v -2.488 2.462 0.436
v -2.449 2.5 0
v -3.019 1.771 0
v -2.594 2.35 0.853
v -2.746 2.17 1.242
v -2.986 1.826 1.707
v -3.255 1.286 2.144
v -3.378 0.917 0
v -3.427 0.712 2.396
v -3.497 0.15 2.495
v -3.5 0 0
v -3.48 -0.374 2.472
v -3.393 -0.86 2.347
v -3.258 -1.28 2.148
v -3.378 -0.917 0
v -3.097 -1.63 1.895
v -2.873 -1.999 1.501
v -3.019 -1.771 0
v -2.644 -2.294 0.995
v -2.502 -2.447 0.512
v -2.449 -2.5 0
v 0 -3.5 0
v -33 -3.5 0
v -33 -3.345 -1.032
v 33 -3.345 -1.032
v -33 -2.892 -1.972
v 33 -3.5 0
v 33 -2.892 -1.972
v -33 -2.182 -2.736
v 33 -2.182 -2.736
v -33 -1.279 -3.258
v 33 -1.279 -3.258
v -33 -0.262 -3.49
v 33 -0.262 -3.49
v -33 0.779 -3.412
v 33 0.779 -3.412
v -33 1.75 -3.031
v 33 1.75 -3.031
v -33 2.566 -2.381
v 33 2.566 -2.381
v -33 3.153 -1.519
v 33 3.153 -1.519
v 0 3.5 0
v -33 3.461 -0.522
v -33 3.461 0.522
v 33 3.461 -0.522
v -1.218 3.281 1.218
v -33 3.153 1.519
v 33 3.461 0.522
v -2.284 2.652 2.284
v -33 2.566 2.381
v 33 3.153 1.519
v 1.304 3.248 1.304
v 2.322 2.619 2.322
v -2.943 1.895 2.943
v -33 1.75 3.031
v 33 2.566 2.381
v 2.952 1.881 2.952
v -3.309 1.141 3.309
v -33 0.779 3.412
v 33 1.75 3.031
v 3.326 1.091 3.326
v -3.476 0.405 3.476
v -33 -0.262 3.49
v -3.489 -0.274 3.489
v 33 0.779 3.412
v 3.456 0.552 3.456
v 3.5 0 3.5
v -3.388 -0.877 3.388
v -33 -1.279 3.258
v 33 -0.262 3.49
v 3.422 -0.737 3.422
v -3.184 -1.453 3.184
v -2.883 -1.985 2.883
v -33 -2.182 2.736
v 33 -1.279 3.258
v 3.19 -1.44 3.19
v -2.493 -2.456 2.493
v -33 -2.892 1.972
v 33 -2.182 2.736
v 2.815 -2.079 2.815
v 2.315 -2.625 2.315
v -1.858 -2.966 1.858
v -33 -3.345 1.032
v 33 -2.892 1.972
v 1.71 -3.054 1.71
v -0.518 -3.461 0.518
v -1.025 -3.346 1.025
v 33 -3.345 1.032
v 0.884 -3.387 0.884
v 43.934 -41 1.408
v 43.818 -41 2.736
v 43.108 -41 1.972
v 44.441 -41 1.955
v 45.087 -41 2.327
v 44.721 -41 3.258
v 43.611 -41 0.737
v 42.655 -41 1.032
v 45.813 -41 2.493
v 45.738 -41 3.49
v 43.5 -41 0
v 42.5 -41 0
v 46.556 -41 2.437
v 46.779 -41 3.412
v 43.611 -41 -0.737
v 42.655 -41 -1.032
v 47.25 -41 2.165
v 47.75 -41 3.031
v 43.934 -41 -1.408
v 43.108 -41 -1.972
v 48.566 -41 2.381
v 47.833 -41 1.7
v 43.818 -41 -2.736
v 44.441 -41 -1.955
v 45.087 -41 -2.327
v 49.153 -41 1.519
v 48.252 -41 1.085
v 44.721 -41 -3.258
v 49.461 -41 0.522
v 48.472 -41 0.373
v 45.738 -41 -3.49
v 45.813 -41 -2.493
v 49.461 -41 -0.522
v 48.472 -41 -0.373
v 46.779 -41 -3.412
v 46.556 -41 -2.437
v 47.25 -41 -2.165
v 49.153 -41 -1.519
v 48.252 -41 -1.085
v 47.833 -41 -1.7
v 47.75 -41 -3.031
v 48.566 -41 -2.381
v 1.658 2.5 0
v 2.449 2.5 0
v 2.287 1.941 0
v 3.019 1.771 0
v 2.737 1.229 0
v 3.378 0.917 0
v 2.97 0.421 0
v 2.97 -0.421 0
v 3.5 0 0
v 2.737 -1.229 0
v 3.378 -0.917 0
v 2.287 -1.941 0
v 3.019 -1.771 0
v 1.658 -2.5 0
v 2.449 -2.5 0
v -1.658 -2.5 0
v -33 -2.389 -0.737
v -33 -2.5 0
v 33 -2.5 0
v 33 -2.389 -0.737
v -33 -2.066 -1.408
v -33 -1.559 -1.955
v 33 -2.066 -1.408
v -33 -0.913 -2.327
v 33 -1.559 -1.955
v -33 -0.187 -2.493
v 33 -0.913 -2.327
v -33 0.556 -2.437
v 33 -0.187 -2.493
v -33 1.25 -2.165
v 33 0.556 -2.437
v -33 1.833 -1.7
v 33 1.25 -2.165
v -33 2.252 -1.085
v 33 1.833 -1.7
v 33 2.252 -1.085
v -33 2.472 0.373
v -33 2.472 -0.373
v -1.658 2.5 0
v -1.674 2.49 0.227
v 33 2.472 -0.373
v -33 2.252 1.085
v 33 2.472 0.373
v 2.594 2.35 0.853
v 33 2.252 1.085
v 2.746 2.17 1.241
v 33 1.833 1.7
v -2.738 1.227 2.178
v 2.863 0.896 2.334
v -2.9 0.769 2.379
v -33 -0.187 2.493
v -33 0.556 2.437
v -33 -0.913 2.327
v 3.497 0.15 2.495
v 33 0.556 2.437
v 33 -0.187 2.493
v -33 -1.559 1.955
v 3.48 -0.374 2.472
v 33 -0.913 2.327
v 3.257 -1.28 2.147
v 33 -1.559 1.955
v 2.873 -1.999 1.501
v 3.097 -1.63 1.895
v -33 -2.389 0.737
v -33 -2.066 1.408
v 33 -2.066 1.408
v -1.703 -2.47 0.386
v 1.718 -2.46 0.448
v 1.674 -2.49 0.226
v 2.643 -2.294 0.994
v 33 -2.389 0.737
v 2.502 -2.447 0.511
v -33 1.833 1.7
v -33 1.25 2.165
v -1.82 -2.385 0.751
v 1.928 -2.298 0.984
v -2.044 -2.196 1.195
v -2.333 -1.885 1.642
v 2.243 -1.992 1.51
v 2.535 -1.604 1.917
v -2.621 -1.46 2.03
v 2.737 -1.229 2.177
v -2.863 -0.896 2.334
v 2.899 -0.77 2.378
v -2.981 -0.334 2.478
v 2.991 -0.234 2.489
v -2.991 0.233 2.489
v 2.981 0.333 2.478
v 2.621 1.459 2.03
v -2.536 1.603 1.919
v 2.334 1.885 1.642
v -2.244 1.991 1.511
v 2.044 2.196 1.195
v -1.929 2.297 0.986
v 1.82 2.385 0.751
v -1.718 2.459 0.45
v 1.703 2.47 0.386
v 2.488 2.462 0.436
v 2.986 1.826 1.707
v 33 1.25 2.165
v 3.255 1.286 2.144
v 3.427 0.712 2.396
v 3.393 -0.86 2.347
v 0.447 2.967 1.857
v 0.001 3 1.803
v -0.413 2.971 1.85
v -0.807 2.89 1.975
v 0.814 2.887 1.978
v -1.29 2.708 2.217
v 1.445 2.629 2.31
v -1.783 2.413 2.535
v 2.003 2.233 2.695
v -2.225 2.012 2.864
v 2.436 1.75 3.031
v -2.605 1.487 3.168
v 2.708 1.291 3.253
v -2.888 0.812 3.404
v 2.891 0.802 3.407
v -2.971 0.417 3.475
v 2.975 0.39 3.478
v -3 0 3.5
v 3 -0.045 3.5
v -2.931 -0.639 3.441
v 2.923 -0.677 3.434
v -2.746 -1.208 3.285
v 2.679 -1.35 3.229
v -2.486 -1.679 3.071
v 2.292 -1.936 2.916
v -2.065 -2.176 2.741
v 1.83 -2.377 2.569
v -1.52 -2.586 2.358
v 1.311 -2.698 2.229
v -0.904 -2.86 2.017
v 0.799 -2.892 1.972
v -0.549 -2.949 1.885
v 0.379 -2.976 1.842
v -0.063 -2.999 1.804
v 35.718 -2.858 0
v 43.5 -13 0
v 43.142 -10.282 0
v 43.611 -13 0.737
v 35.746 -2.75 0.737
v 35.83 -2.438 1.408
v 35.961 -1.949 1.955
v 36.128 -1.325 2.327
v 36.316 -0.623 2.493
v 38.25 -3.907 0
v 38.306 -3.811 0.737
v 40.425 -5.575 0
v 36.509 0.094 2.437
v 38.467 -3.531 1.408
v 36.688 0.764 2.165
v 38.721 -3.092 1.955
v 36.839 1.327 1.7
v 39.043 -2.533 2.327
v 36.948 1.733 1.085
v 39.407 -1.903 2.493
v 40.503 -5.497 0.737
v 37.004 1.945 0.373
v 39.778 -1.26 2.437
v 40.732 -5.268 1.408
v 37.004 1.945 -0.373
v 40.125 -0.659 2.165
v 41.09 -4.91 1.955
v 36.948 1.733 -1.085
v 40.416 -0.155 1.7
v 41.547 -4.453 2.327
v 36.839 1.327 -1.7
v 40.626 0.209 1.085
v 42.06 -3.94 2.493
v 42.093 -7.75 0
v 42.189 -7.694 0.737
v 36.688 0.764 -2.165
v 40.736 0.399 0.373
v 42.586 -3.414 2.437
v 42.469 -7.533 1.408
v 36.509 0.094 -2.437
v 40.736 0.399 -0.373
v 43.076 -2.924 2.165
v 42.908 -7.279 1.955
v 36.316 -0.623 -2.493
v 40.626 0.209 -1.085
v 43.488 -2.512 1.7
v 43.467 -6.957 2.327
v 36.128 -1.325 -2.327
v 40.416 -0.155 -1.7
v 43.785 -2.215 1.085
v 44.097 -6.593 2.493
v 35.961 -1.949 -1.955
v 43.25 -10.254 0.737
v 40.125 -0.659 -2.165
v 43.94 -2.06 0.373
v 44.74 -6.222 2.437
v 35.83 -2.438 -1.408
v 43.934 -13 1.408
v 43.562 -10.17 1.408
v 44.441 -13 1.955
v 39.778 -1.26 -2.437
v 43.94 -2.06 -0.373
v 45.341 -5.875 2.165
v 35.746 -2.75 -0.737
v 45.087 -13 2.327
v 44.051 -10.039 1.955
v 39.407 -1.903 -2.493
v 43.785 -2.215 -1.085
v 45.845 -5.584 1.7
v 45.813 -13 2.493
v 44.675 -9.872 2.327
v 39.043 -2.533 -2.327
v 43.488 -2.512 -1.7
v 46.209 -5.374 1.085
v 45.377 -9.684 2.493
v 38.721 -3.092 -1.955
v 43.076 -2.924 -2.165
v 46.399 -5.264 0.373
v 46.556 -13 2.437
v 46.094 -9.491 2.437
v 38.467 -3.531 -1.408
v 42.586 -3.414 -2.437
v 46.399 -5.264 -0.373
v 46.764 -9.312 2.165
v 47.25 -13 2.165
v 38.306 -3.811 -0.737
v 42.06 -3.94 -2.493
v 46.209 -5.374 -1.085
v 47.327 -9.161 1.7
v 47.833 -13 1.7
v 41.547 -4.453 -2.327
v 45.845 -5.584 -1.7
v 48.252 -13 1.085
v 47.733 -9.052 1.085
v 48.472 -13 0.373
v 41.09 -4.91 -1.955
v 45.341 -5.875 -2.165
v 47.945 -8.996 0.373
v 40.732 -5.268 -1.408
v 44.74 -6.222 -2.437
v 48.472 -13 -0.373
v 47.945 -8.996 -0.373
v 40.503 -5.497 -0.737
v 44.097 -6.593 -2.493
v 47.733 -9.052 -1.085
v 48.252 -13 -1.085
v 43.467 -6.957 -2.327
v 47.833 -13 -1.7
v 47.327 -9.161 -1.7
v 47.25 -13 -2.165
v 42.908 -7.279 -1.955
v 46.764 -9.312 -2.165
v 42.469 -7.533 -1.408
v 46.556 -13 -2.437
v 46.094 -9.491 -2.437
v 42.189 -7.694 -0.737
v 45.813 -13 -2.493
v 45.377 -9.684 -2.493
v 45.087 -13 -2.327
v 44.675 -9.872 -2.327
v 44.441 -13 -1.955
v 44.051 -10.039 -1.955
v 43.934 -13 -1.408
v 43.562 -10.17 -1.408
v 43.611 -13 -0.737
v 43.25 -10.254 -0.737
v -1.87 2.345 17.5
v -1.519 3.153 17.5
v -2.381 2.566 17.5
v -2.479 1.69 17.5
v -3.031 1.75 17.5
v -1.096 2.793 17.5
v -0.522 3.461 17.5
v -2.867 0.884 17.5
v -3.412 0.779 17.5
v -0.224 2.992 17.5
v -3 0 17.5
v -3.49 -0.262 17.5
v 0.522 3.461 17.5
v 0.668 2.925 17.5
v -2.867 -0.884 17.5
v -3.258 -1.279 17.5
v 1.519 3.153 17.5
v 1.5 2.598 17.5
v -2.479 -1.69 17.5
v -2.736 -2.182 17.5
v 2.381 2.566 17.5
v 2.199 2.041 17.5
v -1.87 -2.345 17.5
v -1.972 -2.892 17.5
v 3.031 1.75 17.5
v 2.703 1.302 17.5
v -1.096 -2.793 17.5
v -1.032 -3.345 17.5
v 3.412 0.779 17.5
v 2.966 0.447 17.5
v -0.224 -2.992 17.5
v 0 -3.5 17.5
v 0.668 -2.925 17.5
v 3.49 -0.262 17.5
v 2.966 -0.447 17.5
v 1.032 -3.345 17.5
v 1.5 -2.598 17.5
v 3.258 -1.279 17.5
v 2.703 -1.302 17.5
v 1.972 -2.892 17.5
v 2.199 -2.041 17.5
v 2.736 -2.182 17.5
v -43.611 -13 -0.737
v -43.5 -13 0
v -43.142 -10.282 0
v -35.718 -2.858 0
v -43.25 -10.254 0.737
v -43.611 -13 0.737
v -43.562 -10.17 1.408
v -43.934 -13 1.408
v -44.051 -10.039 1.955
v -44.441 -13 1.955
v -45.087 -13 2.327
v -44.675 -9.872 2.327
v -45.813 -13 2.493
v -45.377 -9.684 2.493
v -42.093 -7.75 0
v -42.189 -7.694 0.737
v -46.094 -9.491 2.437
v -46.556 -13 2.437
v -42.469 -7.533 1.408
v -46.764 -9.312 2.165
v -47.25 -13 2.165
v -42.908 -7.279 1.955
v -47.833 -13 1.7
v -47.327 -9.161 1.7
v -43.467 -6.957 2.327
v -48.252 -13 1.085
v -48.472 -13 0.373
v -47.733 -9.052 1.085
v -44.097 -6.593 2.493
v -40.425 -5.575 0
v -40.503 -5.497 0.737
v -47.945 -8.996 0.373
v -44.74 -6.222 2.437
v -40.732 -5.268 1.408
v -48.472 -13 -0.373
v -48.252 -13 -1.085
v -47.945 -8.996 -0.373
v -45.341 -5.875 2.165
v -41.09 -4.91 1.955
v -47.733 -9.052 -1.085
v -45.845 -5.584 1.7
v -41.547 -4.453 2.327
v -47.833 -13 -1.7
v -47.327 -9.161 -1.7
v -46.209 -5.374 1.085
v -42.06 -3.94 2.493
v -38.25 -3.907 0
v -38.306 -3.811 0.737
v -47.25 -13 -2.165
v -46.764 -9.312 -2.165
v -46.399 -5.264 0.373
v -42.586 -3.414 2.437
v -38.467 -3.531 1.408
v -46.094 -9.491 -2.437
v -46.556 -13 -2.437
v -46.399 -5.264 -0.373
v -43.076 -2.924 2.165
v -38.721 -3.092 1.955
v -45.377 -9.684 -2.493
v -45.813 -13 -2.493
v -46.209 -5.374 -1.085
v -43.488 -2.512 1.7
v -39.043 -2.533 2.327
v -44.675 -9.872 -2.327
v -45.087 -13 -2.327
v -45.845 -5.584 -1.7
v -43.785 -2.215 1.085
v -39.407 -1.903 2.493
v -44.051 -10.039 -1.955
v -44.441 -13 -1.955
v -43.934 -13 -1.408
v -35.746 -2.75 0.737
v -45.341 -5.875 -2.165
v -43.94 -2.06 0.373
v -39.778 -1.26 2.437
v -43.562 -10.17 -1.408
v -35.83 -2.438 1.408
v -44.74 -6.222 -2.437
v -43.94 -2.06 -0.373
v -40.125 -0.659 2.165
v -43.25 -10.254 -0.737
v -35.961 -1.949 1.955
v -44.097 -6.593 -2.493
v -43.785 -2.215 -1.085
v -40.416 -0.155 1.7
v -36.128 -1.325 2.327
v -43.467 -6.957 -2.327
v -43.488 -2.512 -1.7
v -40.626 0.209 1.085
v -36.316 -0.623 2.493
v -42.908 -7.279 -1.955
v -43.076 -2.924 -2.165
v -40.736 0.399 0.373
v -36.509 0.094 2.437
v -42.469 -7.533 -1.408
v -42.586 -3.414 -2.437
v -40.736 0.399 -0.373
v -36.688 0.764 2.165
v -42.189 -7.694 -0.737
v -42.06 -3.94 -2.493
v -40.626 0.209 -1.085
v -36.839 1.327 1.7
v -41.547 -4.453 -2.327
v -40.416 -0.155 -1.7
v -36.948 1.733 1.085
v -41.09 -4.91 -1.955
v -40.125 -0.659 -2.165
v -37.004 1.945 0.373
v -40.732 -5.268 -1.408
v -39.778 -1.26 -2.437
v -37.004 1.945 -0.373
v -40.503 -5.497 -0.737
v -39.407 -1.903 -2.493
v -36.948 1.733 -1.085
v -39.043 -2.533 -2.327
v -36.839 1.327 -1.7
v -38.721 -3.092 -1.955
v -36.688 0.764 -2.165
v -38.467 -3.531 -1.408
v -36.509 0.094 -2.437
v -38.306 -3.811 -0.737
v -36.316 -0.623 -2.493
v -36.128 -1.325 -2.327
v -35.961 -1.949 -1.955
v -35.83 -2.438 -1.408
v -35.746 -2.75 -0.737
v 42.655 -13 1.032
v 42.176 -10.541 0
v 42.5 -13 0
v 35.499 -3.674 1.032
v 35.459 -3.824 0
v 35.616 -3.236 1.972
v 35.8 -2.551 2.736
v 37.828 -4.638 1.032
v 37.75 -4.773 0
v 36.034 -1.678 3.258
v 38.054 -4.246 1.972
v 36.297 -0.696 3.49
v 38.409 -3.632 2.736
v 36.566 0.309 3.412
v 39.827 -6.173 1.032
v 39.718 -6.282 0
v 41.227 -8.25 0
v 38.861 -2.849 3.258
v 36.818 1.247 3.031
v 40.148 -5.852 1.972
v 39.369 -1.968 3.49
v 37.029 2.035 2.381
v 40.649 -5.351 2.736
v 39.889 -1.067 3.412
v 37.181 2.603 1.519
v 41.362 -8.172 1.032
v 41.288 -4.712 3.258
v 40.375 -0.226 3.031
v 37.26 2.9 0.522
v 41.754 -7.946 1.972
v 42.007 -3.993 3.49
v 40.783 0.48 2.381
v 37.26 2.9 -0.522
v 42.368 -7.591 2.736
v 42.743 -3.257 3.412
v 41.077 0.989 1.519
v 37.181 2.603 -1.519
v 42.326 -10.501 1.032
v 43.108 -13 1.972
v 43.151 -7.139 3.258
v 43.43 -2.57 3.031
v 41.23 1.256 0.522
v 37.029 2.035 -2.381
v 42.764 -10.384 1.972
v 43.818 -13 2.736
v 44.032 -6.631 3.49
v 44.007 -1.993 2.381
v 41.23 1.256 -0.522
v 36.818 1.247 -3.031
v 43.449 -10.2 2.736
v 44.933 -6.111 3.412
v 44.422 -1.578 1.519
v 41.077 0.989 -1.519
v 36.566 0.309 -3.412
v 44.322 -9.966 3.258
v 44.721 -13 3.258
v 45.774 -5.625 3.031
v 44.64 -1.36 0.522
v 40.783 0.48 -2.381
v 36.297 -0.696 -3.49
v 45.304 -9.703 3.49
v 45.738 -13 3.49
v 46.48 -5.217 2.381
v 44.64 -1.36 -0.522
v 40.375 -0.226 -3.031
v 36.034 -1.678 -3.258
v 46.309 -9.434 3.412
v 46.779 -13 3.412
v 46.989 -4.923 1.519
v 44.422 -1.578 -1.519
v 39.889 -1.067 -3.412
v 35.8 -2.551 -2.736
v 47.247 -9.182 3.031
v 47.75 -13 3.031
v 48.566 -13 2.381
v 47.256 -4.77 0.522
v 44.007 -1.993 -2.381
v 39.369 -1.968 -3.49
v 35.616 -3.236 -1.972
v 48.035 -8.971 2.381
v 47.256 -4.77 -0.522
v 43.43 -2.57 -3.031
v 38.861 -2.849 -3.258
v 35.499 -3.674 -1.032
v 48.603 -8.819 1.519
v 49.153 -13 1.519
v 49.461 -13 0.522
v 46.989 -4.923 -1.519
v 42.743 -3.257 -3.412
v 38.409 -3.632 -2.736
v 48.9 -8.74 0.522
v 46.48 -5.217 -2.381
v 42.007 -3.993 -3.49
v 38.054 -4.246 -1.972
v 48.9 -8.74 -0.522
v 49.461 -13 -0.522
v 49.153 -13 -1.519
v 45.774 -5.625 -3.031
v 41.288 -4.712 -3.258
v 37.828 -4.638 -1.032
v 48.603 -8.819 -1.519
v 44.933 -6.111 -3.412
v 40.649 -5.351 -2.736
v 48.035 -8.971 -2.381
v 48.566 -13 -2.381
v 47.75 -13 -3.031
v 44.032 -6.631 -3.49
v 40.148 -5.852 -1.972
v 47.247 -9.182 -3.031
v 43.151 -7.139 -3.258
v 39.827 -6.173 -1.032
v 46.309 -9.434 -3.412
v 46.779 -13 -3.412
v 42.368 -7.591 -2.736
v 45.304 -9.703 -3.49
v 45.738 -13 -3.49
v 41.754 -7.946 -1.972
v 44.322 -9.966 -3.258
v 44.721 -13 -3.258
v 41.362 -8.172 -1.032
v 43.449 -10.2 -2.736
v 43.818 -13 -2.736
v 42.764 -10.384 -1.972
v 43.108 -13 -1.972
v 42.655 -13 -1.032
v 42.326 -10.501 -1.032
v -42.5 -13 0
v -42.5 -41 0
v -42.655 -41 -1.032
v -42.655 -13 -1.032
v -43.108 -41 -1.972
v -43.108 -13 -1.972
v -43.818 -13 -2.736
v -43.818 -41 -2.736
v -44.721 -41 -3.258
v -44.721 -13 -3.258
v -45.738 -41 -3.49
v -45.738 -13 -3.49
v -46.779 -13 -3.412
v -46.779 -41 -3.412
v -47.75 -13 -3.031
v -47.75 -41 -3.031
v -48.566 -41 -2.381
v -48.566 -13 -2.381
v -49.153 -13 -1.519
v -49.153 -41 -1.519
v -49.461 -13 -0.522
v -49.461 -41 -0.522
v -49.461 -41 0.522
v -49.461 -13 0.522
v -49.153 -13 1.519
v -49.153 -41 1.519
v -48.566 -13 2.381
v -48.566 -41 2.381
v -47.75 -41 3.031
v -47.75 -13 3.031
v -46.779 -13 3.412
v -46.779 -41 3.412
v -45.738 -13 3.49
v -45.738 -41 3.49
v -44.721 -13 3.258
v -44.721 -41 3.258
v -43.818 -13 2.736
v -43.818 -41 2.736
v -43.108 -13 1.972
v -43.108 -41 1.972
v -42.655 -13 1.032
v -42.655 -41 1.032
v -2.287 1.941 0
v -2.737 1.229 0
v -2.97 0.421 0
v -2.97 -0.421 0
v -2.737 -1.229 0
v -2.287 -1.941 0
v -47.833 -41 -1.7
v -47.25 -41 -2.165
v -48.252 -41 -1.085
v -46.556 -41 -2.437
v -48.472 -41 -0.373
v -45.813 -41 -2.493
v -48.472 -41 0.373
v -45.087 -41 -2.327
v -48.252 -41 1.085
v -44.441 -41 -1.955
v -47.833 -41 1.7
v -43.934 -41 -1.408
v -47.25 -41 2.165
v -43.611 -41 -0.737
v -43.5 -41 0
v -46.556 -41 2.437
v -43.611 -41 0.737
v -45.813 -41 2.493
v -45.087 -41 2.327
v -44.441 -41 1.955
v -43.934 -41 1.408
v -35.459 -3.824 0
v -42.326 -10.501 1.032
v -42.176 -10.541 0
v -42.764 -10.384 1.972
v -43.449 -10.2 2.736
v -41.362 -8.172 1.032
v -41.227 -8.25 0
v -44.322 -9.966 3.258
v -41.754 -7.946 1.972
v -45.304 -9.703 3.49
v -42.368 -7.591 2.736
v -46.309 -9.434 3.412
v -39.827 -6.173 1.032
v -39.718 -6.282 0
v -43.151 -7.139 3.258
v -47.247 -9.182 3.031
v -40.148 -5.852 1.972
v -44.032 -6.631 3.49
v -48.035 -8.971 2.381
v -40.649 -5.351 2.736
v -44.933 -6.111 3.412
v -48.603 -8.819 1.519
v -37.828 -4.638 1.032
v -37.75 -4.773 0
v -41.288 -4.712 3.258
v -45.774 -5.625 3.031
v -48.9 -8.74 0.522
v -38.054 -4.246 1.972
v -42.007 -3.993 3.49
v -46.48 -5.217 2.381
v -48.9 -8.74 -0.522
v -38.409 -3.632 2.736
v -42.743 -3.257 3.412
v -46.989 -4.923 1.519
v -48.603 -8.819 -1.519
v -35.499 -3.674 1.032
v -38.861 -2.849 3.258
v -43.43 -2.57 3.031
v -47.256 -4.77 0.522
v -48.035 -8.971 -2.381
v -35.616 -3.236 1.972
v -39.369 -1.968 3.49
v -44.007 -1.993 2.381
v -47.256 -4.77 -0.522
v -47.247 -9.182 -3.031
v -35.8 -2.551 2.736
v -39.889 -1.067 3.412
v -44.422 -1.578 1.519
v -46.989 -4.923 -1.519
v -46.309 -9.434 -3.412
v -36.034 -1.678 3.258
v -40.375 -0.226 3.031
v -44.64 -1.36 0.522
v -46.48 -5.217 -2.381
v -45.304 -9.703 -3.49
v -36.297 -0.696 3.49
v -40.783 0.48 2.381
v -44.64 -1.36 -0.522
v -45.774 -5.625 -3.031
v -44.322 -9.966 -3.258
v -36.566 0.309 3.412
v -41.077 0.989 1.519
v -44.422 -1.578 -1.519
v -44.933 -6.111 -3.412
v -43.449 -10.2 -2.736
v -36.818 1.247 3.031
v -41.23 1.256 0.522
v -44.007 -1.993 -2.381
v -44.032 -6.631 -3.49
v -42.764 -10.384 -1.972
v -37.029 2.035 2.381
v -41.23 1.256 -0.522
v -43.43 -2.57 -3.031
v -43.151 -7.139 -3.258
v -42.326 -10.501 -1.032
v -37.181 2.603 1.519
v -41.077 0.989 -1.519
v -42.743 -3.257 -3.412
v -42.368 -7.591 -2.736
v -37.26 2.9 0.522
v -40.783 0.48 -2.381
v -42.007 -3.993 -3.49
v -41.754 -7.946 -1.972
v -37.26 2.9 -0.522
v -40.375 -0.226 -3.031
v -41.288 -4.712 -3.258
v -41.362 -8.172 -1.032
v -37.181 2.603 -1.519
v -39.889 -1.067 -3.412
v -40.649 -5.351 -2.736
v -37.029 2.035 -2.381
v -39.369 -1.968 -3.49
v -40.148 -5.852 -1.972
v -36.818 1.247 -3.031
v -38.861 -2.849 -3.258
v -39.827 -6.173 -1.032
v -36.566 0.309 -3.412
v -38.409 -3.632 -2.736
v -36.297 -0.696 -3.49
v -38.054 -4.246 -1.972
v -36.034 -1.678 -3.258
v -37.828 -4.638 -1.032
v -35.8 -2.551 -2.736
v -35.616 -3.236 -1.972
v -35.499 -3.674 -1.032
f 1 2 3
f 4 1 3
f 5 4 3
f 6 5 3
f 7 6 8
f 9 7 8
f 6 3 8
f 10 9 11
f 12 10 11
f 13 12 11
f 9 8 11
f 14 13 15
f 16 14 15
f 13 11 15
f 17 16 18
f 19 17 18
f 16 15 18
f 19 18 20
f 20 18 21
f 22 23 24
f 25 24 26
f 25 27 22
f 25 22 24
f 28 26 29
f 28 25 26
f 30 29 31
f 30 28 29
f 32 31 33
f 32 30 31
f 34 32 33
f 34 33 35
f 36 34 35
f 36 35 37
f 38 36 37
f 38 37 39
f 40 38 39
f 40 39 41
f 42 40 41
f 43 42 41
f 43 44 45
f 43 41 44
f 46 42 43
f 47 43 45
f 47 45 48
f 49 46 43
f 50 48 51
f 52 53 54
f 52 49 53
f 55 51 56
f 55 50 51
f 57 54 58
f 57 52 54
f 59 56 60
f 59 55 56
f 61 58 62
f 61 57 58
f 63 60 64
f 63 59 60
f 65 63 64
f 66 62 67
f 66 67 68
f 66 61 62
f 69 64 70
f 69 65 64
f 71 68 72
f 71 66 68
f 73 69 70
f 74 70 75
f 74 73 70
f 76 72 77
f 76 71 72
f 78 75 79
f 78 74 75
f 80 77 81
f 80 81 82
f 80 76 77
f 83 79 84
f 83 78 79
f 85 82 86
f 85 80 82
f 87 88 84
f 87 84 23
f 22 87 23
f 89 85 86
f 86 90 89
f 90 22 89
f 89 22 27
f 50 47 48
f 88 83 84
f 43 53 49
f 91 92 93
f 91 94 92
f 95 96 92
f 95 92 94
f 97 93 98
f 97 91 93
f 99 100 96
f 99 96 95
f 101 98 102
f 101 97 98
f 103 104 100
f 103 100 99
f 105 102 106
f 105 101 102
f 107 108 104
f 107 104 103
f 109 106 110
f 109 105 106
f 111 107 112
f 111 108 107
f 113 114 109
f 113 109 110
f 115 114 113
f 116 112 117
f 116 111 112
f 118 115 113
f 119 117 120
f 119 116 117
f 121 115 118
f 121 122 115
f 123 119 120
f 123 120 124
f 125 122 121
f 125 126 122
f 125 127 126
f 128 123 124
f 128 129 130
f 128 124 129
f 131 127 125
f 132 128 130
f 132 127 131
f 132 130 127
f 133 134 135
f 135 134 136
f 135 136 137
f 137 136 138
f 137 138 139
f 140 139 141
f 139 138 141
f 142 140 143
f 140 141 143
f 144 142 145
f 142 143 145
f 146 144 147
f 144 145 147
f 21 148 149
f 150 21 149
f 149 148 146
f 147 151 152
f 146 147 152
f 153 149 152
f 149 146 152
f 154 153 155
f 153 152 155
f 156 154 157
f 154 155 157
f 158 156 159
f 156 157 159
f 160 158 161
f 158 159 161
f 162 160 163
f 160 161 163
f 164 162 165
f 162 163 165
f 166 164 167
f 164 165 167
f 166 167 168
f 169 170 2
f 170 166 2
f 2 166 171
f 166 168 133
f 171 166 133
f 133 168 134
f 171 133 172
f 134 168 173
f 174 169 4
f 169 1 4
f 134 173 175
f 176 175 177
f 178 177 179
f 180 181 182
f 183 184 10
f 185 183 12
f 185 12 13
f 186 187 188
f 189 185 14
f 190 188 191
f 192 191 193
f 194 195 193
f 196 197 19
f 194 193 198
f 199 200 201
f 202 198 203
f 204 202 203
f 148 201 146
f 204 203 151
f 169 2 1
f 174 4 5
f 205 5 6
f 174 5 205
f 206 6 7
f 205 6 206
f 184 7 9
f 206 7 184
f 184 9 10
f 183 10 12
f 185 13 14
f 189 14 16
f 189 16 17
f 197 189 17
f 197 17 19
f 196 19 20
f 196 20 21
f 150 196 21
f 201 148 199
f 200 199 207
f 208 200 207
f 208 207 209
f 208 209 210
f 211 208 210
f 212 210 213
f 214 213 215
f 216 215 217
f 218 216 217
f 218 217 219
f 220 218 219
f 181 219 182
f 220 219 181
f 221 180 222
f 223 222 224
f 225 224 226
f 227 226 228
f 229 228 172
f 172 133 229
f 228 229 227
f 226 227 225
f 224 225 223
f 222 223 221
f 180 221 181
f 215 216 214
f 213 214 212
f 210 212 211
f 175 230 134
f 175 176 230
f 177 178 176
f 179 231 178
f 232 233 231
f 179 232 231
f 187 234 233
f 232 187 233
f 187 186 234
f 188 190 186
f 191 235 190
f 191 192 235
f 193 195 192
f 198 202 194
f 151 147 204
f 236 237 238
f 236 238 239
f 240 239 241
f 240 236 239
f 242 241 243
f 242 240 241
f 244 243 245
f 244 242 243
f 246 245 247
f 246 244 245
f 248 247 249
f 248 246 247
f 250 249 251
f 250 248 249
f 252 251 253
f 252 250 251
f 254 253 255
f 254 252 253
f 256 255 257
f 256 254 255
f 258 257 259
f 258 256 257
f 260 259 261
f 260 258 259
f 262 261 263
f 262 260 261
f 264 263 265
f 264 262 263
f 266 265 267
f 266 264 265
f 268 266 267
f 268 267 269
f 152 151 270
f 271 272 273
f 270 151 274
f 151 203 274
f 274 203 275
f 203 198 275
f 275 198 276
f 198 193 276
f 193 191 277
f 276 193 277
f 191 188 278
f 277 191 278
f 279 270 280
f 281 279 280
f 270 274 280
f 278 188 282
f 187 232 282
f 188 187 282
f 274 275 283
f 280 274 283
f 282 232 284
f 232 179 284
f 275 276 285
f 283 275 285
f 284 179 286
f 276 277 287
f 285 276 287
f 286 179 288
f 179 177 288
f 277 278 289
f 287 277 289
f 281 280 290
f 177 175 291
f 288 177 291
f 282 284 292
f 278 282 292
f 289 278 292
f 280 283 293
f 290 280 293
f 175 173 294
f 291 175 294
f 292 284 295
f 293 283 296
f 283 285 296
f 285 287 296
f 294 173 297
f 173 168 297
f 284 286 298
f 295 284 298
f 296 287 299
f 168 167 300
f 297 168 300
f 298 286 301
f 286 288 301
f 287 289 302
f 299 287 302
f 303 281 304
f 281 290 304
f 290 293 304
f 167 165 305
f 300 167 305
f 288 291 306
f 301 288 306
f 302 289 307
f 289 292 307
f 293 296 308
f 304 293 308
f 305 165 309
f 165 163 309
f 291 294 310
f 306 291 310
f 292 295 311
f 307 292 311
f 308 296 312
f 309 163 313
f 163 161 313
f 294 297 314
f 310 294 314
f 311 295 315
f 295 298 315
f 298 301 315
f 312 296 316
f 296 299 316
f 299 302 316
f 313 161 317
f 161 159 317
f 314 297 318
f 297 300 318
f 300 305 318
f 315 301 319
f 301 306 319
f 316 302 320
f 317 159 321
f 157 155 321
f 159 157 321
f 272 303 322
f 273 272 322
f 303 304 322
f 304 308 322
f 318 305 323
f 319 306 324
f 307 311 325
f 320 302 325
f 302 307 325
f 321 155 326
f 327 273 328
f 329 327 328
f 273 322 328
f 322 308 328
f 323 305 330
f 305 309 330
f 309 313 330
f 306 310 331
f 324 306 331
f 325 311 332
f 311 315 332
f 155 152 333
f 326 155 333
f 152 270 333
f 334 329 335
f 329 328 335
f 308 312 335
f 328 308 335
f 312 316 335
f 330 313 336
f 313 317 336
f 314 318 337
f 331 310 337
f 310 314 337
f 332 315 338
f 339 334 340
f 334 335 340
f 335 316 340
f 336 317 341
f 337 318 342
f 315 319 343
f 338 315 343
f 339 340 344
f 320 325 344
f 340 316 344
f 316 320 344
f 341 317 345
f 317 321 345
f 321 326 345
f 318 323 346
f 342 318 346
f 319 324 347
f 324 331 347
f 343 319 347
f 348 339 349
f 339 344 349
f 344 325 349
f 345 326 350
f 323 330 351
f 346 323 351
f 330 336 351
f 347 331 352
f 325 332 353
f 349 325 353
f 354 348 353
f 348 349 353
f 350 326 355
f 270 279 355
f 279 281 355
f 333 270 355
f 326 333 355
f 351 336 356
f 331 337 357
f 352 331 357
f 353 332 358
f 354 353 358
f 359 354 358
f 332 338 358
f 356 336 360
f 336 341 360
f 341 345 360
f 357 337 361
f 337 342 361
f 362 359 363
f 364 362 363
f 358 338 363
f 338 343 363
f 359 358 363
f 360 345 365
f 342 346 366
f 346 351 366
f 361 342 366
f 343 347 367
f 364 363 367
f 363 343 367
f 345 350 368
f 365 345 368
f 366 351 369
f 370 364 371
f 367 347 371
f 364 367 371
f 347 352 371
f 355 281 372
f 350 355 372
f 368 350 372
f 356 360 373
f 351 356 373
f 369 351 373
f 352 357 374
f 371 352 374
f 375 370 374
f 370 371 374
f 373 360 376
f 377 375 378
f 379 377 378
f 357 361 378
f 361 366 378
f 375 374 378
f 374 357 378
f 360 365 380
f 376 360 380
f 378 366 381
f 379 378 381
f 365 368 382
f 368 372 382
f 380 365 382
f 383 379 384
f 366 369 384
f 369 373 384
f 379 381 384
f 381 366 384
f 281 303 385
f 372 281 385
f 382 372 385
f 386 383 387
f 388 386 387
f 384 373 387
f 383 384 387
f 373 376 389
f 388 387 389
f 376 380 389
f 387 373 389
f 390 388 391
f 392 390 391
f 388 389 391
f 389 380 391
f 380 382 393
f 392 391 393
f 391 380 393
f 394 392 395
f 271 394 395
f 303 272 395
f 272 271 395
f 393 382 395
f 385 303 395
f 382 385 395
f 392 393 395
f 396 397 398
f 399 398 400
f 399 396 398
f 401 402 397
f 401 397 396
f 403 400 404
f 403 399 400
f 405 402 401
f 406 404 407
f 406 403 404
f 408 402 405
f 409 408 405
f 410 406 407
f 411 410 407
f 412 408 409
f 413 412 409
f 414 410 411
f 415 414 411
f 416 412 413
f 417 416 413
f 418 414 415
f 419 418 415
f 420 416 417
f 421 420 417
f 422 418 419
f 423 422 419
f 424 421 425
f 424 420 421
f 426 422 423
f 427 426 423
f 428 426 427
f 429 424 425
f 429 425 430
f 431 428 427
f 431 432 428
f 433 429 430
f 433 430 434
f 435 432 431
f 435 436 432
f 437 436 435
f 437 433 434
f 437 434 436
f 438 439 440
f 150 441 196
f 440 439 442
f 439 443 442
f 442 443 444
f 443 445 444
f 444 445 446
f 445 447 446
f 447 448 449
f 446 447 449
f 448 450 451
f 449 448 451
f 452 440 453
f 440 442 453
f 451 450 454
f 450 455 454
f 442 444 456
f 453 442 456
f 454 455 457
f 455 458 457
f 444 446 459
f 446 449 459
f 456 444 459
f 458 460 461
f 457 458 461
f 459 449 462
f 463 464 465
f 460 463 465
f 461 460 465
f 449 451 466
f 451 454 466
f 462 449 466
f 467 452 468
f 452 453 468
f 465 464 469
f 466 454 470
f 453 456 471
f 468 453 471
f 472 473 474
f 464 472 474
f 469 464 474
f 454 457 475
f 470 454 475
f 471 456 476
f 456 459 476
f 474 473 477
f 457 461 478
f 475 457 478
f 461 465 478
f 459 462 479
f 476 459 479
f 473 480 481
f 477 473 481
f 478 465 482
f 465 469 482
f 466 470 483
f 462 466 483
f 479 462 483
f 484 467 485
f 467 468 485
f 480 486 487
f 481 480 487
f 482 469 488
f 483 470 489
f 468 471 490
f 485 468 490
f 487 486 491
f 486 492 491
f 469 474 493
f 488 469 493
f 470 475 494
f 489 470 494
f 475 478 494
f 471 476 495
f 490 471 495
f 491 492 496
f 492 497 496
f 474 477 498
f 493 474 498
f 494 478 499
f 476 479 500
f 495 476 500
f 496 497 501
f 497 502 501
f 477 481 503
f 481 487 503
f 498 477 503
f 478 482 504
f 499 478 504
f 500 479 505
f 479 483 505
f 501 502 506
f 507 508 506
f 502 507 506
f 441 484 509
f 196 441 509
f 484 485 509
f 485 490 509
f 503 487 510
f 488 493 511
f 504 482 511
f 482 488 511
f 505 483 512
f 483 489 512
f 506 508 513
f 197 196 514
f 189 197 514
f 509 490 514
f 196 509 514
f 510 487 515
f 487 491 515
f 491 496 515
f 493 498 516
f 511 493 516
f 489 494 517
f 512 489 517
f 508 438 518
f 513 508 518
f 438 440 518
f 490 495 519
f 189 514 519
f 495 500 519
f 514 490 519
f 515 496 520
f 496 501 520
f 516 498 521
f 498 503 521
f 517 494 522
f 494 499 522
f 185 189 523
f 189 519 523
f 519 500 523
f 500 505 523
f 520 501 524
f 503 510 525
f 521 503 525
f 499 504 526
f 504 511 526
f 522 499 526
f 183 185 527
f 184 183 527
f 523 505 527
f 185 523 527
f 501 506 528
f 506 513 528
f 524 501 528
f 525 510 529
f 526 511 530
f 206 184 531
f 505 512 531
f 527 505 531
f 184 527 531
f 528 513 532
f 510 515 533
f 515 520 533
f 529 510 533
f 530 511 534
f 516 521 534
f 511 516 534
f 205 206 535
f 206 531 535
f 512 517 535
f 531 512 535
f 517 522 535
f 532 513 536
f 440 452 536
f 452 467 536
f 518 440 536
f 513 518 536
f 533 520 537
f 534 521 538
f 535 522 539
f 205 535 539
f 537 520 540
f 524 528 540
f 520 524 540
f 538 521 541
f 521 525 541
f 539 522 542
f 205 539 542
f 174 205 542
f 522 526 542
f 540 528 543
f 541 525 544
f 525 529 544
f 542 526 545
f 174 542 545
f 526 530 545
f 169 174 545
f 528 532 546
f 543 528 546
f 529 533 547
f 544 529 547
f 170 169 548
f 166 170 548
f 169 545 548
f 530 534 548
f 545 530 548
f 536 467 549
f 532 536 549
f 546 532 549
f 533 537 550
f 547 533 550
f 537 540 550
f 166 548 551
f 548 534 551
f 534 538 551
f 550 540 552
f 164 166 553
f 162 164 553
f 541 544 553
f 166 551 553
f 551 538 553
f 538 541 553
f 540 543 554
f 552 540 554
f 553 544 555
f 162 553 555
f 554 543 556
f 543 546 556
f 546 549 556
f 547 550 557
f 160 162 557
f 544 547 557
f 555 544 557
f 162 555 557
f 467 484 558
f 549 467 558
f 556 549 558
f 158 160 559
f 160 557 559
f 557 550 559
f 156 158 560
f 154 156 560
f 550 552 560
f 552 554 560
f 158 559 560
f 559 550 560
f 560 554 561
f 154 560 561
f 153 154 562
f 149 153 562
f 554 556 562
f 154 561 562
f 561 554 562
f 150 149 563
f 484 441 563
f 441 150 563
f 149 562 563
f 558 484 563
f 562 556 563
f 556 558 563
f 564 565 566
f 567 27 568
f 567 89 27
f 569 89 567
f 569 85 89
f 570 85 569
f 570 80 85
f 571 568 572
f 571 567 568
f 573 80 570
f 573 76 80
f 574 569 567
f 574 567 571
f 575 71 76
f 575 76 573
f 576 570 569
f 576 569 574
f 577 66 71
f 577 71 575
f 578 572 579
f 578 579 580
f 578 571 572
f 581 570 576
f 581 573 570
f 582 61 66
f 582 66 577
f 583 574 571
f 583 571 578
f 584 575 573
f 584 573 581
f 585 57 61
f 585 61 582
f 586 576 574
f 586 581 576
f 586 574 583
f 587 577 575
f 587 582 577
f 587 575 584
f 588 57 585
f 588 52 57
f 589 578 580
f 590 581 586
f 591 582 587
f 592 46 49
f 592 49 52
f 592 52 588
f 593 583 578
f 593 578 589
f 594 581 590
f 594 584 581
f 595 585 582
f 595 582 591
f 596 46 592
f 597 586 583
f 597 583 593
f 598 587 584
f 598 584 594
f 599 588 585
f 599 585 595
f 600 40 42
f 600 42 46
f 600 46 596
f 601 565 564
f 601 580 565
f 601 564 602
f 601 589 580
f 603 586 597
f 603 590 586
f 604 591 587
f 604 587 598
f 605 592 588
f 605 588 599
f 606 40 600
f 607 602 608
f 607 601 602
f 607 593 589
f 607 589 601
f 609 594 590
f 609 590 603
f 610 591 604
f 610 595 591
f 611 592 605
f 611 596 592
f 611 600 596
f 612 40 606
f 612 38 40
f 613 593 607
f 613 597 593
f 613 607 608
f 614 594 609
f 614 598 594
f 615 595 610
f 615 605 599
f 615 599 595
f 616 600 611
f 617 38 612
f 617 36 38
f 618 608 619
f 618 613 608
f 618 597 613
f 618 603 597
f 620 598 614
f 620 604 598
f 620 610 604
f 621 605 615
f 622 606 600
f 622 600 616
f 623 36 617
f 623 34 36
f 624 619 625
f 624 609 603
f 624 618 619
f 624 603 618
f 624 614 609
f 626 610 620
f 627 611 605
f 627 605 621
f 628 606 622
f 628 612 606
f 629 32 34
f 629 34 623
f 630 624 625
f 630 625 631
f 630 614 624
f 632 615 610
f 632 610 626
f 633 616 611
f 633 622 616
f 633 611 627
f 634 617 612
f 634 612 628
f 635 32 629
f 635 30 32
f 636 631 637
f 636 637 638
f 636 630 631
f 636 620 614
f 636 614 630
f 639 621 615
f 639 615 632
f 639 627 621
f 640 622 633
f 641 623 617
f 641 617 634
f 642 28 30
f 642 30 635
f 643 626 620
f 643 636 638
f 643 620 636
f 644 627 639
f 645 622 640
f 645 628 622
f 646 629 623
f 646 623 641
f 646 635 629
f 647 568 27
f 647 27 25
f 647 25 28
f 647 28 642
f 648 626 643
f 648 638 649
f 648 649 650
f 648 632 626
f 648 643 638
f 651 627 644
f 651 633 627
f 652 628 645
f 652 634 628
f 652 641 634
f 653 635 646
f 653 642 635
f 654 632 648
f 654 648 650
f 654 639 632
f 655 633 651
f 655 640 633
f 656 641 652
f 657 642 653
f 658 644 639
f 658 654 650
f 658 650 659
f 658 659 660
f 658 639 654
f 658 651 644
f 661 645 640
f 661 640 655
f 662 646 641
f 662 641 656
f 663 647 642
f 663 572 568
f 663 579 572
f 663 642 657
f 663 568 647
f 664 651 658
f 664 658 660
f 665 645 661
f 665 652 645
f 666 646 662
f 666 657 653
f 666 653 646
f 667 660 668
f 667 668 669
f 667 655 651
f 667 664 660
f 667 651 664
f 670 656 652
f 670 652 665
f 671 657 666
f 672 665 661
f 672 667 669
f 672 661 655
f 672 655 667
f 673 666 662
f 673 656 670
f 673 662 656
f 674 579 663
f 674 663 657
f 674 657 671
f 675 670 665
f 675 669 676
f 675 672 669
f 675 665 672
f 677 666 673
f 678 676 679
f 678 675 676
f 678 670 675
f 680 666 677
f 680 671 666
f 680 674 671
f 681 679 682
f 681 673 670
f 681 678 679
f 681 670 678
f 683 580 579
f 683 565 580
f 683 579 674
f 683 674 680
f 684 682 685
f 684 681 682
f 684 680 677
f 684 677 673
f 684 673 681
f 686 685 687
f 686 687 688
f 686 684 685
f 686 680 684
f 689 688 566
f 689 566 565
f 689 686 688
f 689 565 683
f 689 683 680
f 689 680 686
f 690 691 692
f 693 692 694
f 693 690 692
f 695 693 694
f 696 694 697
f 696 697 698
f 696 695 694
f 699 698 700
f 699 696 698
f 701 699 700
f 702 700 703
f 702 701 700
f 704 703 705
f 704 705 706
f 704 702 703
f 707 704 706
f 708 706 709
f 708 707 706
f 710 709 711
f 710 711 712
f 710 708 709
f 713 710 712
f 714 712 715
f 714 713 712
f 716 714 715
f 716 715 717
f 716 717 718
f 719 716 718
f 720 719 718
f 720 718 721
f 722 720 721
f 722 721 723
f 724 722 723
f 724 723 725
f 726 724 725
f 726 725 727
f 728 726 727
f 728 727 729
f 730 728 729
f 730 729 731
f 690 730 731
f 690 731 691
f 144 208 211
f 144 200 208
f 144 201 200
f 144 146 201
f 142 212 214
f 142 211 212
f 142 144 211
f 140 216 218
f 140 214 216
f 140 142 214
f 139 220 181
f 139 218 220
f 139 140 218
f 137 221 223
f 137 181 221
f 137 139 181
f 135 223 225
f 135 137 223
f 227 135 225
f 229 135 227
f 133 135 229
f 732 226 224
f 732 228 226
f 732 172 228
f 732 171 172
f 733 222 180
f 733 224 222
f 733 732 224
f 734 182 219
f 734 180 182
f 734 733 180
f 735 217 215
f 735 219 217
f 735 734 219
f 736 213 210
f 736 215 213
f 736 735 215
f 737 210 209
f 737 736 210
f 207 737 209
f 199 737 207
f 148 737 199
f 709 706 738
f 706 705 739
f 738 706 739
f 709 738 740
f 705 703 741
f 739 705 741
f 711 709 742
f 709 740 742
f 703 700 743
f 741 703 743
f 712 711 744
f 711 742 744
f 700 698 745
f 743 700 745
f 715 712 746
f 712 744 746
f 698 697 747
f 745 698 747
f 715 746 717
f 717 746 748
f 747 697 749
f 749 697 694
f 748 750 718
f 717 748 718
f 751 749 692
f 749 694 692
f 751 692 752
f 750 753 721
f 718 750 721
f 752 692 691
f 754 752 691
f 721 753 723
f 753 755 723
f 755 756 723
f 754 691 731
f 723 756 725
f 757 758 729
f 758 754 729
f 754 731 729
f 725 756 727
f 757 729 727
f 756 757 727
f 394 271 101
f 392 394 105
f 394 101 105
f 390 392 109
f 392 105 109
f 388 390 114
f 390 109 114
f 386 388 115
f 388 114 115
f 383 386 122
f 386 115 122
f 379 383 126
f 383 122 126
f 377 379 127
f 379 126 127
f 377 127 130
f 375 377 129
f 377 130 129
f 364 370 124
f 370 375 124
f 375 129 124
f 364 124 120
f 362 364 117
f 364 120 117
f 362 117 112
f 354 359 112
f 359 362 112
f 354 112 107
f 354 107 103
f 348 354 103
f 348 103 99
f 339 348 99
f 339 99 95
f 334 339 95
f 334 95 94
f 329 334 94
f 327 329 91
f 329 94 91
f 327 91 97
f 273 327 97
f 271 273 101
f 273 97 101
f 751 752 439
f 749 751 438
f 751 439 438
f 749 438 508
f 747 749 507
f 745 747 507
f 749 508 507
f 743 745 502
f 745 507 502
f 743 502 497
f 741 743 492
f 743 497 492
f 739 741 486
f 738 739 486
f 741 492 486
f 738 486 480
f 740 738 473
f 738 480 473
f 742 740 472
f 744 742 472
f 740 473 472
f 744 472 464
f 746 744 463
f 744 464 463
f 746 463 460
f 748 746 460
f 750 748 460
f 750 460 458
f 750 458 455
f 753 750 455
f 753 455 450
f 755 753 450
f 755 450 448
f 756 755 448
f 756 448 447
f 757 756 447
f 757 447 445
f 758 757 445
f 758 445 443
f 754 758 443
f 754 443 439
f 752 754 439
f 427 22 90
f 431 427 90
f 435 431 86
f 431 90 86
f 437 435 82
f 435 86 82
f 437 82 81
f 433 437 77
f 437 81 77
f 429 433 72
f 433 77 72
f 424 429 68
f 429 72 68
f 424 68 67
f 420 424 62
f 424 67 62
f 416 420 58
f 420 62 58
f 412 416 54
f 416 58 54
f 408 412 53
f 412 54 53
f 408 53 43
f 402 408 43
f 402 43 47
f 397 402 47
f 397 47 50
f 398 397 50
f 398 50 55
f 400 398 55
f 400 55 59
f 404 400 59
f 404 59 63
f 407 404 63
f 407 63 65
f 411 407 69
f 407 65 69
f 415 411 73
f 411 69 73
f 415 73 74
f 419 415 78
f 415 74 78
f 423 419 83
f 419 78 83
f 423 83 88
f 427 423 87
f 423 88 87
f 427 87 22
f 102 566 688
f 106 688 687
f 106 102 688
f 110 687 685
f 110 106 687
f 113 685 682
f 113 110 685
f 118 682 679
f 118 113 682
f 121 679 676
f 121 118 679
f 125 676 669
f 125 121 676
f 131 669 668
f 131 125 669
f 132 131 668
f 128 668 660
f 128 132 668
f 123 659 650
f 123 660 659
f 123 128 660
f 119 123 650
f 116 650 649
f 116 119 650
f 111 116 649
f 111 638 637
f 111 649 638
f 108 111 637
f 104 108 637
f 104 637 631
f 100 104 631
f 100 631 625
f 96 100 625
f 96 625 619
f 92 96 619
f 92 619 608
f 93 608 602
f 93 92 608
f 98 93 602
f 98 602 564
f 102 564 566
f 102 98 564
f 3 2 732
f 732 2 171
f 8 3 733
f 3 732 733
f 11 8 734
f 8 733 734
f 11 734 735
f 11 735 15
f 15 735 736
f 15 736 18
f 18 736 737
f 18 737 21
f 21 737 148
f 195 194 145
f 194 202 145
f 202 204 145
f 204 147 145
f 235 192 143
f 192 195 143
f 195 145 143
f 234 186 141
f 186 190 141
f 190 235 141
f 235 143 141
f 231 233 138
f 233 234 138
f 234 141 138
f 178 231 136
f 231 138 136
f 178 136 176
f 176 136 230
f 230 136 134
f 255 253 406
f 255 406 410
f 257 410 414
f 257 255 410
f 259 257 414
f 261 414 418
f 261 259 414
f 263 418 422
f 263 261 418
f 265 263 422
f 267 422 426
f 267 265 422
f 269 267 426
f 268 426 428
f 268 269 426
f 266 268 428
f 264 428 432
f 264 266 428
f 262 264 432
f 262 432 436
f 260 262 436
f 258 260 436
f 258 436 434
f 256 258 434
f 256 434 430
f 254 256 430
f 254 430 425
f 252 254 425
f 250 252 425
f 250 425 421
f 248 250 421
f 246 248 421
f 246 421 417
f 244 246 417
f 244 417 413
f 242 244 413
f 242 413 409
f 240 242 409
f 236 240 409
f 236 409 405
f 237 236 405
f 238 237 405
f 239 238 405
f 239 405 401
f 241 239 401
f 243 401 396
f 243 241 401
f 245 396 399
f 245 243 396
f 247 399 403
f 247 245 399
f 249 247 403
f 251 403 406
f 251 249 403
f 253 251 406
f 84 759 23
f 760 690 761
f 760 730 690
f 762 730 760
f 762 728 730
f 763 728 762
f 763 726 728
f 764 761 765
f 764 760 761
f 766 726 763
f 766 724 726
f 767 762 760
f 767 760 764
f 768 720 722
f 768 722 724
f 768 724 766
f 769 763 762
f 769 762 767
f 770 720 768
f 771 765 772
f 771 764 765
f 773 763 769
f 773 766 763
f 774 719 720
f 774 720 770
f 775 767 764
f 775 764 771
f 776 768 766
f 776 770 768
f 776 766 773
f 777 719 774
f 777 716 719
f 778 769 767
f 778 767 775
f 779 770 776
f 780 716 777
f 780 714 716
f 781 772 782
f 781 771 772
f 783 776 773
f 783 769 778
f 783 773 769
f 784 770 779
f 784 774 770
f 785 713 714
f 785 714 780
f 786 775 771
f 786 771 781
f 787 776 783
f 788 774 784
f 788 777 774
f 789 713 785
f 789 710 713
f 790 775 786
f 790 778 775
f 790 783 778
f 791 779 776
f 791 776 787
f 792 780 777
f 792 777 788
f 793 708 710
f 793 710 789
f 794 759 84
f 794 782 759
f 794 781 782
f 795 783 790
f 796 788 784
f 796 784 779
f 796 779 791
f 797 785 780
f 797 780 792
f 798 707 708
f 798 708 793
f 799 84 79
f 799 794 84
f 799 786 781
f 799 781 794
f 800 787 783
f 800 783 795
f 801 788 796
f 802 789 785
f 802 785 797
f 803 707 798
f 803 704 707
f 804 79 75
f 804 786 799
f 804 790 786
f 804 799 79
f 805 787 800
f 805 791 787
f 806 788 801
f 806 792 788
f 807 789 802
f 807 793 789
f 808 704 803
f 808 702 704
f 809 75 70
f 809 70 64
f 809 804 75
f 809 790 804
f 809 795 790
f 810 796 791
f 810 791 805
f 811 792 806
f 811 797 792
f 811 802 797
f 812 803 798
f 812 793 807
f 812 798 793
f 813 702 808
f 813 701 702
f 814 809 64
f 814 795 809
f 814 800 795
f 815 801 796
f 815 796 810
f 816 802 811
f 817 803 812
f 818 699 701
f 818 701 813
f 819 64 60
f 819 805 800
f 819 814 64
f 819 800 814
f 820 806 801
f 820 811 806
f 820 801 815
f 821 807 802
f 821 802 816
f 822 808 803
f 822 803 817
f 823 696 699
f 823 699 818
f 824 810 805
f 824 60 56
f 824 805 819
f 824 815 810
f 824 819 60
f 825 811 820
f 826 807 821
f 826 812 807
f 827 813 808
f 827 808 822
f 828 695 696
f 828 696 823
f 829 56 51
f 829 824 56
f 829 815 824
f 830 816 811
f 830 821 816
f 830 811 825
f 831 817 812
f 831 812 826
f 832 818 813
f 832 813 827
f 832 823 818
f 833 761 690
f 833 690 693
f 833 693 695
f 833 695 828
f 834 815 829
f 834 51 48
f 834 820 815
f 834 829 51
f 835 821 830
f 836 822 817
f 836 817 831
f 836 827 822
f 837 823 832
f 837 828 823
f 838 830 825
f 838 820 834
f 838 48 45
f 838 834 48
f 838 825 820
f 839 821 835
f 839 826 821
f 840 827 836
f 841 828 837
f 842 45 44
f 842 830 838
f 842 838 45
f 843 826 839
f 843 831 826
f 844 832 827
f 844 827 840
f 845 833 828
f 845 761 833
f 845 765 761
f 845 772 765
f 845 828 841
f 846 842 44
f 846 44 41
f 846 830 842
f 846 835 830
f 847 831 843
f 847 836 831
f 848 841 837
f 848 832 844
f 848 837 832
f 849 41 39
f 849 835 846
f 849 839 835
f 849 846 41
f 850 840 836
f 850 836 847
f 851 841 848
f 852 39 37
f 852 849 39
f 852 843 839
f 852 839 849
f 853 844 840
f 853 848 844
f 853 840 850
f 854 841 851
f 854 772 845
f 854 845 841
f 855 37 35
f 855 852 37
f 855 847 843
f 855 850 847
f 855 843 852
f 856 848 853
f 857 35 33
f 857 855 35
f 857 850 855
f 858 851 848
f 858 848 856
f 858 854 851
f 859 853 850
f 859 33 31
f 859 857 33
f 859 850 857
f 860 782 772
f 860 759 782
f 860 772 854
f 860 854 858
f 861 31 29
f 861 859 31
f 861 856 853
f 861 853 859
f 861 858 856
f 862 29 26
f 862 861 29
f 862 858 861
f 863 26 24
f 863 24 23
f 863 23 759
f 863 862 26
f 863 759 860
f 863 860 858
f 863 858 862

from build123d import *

# Parameters (mm, degrees)
SWEEP_THIN2_PROFILE_R   = 3.5
SWEEP_THIN2_PROFILE_R_2 = 2.5
SKETCH57_R              = 3.5
SKETCH57_R_2            = 3
BOSS_EXTRUDE1_DEPTH     = 17.5


with BuildPart() as part:
    # Sweep-Thin2: sweep along a path in Sketch28
    with BuildLine(Plane.XY) as sweep_thin2_path:
        Line((-46, -41), (-46, -13))
        ThreePointArc((-46, -13), (-42.192388155, -3.807611845), (-33, 0))
        Line((-33, 0), (33, 0))
        ThreePointArc((33, 0), (42.192388155, -3.807611845), (46, -13))
        Line((46, -13), (46, -41))
    # Sweep-Thin2 profile (on start of the path) → Sweep-Thin2 (sweep)
    with BuildSketch(Plane(origin=(-46, -41, 0), x_dir=(1, 0, 0), z_dir=(0, 1, 0))):
        Circle(SWEEP_THIN2_PROFILE_R)
        Circle(SWEEP_THIN2_PROFILE_R_2, mode=Mode.SUBTRACT)
    sweep(path=sweep_thin2_path.line)

    # Sketch57 → Boss-Extrude1 (add)
    with BuildSketch(Plane.XY):
        with Locations(Location((0, 0, 0), (0, 0, 270))):
            Circle(SKETCH57_R)
        with Locations(Location((0, 0, 0), (0, 0, 180))):
            Circle(SKETCH57_R_2, mode=Mode.SUBTRACT)
    extrude(amount=BOSS_EXTRUDE1_DEPTH)


solid = part.part
